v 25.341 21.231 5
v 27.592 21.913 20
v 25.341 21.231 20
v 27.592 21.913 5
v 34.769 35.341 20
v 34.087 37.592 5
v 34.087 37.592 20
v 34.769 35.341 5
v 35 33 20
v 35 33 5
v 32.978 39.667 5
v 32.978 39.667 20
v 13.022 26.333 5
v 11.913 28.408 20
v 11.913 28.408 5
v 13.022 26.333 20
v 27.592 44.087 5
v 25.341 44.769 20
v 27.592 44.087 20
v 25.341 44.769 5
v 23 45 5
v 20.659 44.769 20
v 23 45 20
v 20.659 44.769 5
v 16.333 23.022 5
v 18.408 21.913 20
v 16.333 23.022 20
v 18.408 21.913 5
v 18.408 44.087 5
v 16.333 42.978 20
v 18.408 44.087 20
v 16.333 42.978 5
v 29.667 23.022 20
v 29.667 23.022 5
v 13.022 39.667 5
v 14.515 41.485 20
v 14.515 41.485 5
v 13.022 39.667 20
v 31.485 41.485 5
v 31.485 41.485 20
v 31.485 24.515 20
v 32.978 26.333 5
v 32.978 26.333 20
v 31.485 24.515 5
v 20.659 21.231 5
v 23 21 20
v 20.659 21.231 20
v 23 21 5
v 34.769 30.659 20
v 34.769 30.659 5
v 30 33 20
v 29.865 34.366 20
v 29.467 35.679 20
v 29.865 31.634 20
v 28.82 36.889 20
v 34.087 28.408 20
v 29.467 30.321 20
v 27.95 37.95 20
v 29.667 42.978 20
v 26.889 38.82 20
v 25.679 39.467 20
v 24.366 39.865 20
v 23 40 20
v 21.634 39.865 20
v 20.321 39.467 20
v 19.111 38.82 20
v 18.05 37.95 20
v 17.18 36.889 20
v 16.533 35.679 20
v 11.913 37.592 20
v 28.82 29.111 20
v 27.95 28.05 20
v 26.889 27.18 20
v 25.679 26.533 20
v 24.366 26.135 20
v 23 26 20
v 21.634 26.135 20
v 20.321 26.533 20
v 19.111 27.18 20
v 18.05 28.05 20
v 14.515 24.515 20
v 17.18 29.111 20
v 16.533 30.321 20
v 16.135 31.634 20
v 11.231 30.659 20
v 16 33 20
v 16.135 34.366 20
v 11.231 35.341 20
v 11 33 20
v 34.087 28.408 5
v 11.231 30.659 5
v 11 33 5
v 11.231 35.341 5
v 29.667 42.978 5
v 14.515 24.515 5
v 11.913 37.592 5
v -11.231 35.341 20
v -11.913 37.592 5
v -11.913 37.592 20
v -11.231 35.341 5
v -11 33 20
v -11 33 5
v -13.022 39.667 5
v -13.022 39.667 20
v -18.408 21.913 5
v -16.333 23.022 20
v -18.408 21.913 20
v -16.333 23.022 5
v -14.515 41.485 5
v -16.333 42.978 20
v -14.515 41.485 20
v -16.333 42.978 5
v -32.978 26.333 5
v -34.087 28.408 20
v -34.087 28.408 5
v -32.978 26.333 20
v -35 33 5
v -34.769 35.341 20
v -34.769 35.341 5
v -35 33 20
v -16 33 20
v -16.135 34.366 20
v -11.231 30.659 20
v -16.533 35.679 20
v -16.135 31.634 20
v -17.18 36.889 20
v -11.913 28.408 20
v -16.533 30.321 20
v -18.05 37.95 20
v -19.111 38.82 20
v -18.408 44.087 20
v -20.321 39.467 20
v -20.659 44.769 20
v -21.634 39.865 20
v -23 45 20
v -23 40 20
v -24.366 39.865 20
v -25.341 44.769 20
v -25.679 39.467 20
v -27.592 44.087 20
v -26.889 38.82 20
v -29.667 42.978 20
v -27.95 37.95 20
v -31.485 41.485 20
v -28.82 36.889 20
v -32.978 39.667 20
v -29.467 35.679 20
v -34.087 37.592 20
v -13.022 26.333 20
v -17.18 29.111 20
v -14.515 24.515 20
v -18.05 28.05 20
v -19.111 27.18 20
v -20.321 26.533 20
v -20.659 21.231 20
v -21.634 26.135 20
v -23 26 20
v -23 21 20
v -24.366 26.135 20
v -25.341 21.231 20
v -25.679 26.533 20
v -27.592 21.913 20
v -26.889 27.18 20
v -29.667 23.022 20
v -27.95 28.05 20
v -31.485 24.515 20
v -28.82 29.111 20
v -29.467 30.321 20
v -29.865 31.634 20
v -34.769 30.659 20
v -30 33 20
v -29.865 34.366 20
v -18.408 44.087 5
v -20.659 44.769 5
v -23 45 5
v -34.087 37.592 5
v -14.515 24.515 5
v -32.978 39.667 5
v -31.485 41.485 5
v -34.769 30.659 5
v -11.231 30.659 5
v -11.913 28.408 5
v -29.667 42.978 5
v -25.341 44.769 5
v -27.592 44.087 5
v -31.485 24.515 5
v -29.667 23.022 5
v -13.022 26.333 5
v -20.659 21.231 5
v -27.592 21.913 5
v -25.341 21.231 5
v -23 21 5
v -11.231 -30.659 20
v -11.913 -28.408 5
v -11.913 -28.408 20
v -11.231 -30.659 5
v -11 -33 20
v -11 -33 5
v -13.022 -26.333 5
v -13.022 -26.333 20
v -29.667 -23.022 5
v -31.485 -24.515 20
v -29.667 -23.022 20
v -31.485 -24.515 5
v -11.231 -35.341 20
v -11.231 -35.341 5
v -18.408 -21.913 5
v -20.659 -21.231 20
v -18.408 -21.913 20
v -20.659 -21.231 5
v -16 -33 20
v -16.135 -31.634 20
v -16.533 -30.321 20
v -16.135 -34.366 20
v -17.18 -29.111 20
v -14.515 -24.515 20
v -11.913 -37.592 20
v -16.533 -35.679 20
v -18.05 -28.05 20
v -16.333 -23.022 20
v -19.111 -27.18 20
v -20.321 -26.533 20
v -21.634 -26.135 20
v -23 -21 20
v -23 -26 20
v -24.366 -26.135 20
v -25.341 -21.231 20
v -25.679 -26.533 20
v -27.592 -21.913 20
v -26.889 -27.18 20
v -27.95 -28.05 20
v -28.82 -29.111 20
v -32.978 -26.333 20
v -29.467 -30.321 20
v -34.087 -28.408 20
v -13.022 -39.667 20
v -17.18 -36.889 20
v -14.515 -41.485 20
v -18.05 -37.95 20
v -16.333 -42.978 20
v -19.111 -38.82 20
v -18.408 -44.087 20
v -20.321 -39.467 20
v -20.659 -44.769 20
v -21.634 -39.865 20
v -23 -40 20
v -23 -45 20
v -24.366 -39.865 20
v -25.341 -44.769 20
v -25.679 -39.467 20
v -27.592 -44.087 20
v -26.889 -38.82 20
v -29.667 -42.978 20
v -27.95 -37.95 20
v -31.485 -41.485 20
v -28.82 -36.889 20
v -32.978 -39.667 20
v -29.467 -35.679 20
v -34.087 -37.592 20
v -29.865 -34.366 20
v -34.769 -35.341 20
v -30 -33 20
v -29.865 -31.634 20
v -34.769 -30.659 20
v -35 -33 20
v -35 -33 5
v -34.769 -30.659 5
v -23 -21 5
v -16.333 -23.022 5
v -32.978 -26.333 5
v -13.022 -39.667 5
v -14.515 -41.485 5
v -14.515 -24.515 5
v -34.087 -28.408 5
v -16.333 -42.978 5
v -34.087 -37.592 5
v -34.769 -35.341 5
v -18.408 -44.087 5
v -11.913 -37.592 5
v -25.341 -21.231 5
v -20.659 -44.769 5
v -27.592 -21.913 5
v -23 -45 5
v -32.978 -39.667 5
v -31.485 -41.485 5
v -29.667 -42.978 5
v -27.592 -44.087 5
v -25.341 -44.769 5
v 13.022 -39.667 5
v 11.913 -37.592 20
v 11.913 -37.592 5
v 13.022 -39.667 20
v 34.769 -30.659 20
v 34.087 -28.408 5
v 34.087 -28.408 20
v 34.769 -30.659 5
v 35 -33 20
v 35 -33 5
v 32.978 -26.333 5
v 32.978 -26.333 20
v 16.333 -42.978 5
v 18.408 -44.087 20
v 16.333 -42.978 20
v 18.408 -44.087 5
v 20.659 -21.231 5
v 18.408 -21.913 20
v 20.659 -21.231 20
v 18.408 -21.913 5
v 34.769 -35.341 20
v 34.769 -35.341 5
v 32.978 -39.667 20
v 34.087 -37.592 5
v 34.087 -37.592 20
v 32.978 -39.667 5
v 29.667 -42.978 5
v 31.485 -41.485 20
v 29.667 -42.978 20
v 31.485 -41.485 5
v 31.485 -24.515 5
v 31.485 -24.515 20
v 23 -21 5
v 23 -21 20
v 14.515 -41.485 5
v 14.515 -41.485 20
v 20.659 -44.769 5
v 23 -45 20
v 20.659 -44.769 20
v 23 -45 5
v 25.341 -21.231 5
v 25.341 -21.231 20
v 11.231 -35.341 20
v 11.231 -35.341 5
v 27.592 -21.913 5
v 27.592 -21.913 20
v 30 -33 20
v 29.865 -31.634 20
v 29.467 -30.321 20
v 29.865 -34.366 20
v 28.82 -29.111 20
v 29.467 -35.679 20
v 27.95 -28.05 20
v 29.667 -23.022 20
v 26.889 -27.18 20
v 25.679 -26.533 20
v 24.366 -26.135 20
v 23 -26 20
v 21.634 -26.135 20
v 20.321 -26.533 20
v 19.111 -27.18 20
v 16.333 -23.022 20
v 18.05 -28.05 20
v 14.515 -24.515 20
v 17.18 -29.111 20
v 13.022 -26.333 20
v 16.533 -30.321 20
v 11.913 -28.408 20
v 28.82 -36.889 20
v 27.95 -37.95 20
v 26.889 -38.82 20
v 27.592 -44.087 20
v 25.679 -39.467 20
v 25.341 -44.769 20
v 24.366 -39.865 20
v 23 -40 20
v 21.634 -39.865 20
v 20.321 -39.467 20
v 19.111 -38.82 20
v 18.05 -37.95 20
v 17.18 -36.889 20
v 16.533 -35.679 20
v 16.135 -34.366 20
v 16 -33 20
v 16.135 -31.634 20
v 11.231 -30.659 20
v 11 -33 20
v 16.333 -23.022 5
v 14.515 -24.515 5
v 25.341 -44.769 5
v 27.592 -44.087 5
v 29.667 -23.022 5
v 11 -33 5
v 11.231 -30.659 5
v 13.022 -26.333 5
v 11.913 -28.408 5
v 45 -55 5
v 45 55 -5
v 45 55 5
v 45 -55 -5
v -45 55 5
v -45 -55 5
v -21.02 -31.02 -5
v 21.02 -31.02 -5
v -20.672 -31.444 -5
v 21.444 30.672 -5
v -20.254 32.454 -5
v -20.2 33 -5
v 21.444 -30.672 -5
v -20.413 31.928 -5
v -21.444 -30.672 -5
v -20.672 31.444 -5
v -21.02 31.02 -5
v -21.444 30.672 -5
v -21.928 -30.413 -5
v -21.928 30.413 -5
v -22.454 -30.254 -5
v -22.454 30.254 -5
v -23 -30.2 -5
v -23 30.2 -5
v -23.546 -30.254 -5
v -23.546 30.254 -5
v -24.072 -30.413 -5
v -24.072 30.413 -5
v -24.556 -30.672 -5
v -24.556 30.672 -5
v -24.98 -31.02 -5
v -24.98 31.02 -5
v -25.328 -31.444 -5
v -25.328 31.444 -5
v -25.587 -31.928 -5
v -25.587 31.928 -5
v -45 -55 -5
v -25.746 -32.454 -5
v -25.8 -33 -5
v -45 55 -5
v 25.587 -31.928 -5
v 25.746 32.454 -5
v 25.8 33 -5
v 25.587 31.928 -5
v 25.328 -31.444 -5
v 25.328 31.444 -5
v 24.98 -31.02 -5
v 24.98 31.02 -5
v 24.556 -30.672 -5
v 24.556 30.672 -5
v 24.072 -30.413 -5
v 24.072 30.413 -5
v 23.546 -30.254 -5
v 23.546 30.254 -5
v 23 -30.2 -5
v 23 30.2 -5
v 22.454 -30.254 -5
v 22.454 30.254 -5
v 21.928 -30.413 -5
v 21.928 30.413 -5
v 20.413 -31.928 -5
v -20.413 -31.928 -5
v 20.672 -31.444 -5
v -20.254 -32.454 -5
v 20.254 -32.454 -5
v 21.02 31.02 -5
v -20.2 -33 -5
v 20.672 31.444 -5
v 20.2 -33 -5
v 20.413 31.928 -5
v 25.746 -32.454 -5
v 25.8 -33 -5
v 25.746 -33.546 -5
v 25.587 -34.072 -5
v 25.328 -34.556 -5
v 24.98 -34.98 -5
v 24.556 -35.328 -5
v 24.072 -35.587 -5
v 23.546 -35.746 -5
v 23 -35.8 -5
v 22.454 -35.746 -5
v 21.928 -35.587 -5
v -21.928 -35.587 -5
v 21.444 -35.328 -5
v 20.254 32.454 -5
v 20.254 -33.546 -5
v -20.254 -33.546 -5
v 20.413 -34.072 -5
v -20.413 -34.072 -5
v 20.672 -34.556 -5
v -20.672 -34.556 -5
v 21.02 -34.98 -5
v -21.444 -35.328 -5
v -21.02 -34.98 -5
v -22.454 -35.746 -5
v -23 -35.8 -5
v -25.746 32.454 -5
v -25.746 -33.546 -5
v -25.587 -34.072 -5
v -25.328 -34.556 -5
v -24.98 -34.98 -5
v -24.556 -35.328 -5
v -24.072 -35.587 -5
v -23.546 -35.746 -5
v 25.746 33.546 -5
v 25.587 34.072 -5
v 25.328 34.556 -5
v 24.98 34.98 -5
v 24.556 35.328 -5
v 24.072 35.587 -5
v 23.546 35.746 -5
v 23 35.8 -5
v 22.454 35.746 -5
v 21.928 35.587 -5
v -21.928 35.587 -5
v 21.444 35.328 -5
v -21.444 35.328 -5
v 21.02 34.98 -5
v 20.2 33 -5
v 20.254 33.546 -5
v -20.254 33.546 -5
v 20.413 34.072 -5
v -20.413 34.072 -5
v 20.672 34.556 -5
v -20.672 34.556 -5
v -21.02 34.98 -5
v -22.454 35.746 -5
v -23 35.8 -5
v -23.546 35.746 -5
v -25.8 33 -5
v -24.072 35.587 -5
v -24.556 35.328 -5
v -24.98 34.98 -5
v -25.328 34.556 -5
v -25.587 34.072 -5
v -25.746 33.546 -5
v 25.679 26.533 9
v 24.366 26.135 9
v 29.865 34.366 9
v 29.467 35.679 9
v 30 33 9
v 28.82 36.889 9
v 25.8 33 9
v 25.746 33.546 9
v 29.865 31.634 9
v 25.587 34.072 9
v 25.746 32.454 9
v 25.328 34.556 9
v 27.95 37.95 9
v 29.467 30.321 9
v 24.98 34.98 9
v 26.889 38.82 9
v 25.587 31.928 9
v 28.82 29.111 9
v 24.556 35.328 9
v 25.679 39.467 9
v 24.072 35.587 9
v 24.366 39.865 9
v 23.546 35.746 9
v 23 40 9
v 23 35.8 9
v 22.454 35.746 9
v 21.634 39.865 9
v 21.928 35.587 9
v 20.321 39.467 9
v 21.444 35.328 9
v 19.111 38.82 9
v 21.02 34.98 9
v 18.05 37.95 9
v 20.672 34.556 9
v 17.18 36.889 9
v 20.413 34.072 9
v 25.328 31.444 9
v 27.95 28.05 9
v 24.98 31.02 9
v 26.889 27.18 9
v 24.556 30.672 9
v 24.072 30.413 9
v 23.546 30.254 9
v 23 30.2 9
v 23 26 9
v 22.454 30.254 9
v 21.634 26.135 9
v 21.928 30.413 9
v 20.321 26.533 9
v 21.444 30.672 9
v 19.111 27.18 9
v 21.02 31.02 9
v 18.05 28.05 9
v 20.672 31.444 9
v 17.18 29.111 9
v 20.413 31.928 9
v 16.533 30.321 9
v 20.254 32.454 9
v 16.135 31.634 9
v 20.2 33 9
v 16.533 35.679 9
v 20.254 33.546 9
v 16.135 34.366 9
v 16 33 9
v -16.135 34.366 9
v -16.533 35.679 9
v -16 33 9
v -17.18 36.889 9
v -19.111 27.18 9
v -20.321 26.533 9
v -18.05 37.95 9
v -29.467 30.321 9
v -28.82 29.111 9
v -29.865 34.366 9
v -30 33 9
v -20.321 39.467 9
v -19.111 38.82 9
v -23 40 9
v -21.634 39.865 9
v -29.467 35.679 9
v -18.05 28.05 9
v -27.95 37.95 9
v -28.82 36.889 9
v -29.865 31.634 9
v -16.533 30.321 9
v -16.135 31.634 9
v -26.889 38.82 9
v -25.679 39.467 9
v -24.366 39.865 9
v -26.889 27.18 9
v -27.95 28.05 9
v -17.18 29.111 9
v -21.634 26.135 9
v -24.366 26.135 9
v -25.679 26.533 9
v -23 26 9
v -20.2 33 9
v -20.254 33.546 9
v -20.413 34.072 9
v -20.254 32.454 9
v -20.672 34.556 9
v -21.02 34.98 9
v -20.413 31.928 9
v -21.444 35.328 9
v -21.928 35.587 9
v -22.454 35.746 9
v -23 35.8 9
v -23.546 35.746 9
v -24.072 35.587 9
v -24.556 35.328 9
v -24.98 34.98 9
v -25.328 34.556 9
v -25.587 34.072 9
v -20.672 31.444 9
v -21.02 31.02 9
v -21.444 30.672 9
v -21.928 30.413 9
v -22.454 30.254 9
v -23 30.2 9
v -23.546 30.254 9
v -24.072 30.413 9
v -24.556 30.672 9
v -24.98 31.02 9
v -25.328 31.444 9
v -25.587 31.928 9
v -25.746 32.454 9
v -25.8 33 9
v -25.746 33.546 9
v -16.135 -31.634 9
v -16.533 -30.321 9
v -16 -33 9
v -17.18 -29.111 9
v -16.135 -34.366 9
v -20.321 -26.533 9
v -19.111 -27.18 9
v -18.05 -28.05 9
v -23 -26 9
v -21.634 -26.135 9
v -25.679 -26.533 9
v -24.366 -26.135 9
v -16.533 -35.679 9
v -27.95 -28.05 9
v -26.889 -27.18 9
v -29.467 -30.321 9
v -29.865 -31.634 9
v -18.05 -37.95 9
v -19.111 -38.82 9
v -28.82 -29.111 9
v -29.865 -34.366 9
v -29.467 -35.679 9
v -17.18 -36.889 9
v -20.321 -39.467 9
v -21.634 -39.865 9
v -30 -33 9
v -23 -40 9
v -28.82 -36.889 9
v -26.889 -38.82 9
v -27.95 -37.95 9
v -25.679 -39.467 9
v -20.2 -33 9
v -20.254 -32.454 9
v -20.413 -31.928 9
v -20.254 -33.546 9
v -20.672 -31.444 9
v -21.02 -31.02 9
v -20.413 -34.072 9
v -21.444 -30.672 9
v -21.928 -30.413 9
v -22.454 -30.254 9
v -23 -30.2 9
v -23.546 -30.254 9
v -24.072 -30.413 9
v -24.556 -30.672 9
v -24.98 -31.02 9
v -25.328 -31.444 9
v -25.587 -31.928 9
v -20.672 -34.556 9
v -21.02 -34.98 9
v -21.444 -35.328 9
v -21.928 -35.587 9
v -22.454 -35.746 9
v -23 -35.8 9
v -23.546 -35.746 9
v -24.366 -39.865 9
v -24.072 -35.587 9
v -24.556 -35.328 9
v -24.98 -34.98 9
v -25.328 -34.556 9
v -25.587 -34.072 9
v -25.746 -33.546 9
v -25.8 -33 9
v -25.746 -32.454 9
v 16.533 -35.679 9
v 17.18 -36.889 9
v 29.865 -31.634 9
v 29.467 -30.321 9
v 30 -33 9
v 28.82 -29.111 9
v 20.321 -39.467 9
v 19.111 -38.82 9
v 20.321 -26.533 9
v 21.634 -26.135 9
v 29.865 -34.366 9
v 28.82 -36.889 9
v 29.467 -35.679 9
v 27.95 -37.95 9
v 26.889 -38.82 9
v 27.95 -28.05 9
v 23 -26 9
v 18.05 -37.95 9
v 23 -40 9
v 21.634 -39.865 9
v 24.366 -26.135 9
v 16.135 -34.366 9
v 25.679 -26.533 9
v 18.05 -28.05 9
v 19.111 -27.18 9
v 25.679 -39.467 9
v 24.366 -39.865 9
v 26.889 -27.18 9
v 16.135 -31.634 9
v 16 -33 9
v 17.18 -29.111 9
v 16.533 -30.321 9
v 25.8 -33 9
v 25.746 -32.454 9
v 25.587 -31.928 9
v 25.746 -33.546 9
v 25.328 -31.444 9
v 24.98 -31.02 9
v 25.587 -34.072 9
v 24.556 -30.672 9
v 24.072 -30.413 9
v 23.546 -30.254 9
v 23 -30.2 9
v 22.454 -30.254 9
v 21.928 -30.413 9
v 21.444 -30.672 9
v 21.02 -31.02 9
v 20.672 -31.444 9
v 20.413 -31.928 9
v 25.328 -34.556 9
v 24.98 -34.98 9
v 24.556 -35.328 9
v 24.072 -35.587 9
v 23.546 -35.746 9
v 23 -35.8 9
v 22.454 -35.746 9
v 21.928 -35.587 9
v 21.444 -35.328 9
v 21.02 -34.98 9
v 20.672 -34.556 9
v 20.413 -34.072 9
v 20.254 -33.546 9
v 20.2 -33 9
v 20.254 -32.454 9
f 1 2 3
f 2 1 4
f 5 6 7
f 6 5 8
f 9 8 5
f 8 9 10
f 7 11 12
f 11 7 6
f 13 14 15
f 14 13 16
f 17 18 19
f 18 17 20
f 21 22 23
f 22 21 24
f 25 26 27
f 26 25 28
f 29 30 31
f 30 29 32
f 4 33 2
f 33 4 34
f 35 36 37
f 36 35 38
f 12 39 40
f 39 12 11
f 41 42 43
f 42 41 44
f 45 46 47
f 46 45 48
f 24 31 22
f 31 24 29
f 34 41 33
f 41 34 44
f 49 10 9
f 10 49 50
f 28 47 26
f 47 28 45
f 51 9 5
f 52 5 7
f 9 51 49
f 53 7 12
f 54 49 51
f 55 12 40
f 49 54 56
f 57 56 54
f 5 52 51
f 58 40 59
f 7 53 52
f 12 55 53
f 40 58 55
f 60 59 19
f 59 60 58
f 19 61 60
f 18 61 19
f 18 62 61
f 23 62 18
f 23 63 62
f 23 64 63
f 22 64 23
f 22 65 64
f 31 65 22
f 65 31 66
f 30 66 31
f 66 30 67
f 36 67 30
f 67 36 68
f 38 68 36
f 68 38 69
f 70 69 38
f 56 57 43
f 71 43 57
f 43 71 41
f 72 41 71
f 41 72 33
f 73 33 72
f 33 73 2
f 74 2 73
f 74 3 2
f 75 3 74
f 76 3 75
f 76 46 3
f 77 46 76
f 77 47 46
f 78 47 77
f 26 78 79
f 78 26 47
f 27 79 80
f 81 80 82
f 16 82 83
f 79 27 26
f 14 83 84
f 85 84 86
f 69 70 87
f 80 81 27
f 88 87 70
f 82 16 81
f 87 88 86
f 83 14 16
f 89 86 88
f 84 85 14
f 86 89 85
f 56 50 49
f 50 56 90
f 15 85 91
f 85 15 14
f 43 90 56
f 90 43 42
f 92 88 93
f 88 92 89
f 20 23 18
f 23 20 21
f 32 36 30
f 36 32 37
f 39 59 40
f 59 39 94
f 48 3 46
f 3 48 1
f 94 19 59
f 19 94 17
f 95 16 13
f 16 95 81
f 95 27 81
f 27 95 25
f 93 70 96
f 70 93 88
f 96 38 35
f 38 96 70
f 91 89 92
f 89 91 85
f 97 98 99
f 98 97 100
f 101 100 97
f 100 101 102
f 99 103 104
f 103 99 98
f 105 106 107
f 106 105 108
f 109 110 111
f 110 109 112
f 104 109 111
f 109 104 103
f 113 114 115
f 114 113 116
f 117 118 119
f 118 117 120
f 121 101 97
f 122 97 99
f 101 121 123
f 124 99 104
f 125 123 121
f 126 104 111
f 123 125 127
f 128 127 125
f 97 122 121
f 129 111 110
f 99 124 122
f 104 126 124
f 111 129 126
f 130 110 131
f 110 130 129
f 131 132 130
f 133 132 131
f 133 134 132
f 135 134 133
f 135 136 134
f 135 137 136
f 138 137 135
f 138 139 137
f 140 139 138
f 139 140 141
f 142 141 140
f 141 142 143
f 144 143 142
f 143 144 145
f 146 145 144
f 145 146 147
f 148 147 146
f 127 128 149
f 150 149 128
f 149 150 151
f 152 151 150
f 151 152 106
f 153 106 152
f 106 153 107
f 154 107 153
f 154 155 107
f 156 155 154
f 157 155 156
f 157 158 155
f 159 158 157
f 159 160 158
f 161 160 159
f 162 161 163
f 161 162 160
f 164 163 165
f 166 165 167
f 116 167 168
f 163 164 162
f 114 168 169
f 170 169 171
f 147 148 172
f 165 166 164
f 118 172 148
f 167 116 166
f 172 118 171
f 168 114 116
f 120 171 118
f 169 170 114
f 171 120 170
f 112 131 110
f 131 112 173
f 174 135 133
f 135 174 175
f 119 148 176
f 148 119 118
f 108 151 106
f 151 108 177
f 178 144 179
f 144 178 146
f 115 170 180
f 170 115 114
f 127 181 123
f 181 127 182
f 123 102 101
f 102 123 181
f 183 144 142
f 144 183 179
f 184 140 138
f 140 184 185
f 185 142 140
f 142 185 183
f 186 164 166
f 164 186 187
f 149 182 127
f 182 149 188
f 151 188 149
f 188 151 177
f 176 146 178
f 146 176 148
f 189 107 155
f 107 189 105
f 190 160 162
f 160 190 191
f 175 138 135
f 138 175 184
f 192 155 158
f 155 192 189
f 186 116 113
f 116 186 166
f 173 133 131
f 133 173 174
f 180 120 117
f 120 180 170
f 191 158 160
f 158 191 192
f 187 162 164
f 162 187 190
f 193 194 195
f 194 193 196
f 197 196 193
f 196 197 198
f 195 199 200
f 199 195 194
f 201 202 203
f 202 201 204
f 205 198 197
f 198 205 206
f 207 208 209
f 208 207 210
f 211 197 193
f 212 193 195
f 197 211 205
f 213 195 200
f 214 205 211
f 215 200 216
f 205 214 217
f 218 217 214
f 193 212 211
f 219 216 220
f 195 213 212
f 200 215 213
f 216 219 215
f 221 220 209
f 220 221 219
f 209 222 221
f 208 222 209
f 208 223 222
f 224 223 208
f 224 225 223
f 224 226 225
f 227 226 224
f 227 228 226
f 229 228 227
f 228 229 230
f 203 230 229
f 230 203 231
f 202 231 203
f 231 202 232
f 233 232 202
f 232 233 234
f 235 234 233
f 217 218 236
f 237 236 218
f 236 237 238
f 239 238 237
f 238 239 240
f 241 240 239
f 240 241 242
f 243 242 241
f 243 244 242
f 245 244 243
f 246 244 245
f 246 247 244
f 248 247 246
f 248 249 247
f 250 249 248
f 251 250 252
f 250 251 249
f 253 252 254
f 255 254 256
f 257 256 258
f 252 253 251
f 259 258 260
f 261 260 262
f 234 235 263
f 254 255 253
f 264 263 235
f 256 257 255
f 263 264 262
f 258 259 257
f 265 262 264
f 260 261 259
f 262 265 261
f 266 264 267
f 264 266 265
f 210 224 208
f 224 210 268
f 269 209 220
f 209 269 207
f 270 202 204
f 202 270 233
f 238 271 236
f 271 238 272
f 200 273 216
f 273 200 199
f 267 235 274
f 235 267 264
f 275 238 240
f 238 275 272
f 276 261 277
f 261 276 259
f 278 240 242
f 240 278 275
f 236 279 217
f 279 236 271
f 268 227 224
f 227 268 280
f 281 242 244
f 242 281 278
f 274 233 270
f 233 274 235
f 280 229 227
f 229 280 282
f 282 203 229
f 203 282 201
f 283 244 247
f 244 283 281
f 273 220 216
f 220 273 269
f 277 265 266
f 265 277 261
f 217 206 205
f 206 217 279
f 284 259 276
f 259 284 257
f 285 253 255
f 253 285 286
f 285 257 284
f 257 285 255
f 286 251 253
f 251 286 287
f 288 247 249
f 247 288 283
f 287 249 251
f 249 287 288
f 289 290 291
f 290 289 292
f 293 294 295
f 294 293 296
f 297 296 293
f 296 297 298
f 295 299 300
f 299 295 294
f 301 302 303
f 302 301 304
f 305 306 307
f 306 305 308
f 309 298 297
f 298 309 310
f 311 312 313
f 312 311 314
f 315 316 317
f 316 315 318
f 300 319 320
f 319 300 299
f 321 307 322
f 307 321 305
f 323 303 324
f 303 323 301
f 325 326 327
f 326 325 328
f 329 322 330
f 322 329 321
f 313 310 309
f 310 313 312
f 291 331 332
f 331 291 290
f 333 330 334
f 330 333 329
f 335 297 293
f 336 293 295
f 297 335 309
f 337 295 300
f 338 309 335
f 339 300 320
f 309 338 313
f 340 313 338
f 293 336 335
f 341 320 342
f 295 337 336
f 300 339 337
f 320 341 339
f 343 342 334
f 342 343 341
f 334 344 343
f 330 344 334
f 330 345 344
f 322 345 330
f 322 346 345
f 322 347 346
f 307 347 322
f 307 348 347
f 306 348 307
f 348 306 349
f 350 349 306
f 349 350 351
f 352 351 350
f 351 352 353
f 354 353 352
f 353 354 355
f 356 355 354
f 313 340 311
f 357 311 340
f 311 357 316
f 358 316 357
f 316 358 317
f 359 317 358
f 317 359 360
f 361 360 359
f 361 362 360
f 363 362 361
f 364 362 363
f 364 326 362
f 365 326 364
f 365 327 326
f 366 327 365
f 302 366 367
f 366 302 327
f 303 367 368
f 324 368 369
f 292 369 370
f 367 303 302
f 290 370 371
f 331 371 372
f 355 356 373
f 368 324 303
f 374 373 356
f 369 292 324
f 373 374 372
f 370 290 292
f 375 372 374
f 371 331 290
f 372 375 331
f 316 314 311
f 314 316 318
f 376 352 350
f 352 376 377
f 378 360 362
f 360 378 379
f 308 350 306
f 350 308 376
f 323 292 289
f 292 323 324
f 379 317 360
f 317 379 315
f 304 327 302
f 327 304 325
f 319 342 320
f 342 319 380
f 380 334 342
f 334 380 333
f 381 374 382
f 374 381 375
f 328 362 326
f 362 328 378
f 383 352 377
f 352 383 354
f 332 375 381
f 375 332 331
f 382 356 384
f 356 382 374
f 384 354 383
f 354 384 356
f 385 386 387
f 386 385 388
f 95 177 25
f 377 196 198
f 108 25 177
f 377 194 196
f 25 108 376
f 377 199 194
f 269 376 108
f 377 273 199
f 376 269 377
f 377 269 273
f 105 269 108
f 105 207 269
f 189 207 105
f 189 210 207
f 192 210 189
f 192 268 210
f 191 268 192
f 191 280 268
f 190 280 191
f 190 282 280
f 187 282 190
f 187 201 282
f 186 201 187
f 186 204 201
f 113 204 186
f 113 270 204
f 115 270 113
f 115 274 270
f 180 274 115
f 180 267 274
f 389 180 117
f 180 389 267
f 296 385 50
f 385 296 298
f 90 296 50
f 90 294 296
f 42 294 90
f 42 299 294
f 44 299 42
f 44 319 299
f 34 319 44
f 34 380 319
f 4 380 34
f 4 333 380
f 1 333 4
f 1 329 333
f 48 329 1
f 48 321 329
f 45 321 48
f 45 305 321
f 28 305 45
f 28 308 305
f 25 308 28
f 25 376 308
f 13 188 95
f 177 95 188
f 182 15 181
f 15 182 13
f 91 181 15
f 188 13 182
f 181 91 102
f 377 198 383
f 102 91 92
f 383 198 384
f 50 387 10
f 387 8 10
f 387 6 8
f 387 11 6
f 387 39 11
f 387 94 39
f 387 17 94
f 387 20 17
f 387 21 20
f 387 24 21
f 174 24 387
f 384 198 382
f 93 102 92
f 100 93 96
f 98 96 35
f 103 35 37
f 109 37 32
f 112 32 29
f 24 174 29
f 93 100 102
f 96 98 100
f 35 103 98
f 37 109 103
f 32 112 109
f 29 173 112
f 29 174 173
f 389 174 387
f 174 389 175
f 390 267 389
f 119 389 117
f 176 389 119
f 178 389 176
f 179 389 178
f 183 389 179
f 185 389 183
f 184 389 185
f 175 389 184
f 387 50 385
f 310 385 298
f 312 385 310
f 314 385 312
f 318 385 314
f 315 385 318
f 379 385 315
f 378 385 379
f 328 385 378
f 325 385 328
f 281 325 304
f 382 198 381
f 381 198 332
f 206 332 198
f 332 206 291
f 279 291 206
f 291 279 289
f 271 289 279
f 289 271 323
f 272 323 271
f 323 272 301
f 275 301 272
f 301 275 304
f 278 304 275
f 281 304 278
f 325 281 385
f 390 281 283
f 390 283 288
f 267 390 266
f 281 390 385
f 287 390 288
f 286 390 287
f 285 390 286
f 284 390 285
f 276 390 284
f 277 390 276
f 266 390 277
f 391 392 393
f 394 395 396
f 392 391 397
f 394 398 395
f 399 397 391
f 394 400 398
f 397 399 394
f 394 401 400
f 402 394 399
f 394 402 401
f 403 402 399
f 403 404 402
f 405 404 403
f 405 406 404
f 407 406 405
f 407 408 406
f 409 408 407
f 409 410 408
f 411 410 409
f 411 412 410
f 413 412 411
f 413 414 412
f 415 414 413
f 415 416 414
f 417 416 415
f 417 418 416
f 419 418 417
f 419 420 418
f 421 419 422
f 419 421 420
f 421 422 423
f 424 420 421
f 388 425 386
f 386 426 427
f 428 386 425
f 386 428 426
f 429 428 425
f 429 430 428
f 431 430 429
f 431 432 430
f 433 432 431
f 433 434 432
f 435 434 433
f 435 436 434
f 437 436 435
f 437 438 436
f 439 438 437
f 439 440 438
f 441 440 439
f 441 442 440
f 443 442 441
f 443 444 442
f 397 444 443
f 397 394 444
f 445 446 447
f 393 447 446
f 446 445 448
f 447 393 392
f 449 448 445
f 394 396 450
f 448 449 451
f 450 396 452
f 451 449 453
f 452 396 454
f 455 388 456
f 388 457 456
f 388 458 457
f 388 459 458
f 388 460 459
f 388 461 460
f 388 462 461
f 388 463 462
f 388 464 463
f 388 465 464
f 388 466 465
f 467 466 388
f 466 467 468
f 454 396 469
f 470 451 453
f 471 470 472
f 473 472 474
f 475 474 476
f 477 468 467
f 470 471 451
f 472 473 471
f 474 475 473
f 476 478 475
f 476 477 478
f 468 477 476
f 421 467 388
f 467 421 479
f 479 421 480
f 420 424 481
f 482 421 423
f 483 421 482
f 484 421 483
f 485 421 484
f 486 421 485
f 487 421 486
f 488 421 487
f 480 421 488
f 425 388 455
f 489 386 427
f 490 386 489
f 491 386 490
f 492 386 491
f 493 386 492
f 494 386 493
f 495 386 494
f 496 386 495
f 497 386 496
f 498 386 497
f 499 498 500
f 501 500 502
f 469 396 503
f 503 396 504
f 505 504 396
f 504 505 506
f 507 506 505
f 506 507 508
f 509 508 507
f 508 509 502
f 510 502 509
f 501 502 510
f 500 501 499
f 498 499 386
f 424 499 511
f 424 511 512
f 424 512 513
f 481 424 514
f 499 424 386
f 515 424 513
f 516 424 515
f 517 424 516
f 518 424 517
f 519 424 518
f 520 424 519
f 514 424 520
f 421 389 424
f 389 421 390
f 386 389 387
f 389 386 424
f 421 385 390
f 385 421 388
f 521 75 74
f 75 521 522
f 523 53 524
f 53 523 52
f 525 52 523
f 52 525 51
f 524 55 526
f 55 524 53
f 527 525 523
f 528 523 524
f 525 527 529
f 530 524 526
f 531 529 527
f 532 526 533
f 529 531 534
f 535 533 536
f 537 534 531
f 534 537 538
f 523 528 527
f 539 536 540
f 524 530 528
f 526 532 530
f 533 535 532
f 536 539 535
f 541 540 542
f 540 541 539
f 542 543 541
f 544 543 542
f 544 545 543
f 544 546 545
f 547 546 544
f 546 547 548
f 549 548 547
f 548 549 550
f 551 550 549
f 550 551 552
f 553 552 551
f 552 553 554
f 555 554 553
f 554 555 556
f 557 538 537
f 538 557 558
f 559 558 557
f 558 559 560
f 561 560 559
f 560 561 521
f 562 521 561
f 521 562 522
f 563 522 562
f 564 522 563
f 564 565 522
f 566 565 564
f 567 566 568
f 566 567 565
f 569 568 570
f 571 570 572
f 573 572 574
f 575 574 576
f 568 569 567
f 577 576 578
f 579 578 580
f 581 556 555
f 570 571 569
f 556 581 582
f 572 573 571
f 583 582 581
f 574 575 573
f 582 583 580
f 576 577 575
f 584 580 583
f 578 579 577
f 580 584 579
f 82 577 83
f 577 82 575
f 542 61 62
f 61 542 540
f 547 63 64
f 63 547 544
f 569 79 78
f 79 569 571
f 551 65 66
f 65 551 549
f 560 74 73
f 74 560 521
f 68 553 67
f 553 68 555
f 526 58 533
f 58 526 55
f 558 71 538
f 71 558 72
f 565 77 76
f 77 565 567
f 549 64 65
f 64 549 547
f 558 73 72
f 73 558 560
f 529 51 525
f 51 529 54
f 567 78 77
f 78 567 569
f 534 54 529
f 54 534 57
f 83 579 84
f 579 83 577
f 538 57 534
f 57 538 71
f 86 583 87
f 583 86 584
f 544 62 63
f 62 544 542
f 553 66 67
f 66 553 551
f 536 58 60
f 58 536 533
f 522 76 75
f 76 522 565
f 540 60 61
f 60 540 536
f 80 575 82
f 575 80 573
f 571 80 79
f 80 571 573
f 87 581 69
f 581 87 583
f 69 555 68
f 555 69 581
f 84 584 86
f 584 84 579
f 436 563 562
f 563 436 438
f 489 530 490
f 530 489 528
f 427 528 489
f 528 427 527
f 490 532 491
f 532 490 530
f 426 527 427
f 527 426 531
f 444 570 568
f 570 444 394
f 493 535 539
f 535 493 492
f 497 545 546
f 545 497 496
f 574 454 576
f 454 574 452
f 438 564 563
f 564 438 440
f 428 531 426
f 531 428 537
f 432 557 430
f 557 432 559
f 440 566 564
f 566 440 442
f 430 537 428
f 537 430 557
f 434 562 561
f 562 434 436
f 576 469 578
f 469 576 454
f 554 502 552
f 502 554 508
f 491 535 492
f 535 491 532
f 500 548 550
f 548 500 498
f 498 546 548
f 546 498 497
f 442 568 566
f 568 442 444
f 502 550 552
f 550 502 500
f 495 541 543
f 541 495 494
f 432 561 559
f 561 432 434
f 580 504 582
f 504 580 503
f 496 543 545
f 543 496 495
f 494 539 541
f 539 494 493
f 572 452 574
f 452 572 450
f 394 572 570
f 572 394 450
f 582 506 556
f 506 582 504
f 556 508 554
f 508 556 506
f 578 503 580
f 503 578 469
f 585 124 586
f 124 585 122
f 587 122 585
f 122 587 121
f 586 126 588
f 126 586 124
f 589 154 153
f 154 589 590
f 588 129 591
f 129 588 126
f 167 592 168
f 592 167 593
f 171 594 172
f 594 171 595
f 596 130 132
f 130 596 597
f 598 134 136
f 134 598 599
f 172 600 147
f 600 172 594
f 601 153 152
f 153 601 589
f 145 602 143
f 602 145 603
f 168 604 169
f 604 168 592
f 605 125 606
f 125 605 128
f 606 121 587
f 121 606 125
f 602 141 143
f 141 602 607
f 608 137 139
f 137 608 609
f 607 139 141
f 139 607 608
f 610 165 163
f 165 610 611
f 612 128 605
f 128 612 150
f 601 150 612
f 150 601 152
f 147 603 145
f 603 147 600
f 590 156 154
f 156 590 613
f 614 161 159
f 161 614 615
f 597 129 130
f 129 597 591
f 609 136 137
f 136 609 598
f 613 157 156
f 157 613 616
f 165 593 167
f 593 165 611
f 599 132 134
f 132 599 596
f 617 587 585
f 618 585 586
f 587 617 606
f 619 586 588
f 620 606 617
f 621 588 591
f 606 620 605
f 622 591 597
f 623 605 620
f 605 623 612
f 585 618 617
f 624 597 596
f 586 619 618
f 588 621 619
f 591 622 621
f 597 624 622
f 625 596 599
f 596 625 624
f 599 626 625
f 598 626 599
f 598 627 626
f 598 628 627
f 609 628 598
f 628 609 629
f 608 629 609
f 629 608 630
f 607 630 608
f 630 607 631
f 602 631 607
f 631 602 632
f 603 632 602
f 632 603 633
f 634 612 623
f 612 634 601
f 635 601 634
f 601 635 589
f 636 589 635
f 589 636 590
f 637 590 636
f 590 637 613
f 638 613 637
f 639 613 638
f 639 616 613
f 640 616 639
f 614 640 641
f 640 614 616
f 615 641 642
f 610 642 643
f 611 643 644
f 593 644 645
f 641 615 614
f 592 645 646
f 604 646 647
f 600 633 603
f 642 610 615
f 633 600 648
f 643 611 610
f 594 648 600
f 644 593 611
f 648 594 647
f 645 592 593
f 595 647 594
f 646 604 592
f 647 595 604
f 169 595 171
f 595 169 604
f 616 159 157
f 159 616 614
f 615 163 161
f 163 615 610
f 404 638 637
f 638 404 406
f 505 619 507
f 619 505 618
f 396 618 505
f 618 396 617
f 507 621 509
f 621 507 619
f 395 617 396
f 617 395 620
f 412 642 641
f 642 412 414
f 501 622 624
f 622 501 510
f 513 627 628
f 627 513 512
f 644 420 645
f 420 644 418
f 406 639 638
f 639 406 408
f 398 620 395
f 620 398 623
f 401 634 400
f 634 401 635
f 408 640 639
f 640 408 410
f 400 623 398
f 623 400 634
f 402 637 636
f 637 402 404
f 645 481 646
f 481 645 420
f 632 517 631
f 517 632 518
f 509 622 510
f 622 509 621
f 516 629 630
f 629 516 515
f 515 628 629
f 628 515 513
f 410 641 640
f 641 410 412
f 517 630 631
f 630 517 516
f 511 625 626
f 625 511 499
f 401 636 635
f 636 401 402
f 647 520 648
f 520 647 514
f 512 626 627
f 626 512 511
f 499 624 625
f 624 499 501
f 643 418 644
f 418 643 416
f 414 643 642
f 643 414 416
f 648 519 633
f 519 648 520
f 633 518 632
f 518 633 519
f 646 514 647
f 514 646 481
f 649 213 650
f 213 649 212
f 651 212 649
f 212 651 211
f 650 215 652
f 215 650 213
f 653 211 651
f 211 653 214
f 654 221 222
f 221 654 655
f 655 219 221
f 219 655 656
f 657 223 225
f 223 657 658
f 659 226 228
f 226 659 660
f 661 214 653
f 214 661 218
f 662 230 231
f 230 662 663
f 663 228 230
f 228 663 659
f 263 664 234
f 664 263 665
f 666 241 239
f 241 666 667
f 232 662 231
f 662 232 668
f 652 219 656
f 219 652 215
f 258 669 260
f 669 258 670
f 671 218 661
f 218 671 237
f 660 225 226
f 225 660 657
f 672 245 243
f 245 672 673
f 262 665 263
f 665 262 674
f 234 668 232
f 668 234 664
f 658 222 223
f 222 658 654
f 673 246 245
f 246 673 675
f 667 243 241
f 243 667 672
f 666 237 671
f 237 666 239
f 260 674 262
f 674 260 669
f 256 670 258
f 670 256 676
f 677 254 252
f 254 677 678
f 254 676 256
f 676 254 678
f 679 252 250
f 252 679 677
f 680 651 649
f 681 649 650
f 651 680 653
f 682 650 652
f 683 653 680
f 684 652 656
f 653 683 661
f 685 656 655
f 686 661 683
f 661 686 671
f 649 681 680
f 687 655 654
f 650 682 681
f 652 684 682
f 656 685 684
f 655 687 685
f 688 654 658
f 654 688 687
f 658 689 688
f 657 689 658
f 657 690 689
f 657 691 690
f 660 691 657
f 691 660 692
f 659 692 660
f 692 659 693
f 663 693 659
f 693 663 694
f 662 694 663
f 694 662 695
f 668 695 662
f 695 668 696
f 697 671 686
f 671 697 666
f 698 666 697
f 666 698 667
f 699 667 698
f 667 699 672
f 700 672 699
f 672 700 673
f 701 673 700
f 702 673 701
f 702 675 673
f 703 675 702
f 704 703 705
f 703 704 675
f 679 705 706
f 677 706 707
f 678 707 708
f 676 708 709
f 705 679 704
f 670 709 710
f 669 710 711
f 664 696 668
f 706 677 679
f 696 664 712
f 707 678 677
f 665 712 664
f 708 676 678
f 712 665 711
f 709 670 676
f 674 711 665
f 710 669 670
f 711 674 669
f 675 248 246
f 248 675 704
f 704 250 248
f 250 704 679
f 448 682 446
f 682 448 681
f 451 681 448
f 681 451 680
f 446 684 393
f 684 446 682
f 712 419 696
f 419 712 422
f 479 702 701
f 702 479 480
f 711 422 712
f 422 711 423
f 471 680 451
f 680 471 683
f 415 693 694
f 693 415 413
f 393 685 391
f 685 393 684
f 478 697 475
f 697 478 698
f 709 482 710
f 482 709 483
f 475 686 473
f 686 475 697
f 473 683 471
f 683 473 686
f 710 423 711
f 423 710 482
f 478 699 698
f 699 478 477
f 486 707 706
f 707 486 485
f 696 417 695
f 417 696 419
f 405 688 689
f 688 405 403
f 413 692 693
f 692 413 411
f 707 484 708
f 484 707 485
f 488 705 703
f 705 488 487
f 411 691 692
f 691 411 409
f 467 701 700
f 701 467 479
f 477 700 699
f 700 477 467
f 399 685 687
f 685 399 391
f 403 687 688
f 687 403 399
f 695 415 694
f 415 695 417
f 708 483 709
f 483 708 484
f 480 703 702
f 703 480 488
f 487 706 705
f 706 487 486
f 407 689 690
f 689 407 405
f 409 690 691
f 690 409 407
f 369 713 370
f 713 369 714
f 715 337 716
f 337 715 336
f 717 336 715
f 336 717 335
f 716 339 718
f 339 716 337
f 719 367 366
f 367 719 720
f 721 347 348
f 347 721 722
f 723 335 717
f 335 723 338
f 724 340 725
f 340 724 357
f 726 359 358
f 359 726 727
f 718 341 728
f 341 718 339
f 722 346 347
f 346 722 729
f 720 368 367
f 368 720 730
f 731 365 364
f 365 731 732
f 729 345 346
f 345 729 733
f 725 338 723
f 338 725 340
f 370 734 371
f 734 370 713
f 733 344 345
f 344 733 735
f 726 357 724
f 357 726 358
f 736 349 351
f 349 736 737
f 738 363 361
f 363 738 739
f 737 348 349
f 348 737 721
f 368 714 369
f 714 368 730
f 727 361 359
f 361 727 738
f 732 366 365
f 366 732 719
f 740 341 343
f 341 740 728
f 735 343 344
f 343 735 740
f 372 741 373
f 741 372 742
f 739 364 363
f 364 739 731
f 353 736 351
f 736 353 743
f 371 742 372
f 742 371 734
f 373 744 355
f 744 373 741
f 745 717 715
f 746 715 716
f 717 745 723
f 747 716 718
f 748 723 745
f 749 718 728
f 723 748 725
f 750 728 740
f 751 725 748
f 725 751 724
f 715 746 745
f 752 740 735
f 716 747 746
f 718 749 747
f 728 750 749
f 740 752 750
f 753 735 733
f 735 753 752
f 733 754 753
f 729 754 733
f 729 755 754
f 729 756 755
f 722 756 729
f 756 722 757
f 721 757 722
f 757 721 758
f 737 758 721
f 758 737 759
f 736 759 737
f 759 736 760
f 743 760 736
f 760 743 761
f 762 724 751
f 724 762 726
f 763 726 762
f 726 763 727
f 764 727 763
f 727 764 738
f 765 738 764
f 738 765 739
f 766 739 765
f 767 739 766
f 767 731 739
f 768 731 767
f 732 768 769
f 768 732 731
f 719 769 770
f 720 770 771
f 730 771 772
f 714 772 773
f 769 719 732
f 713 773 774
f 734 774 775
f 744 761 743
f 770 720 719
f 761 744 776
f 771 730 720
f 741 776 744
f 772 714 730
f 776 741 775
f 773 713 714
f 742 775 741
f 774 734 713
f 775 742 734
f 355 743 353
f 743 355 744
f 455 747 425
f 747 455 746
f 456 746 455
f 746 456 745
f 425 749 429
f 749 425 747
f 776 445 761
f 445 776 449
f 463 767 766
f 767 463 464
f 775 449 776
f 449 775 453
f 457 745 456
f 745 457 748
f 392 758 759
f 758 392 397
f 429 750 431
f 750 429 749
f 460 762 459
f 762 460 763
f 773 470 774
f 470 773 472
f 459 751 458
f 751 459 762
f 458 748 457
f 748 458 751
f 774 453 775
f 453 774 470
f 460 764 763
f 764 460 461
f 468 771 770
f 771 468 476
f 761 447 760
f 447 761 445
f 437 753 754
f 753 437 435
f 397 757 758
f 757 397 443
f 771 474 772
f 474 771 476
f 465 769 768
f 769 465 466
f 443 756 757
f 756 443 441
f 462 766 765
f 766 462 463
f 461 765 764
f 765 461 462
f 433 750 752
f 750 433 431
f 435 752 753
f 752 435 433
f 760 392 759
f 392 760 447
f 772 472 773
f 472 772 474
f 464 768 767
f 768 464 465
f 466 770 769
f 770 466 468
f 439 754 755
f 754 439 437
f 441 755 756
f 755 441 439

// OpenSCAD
$fn = 32;

// ----------------------------------------------------------------------
// Socket pad plate
// bosses with counterbored sockets for the screws
// ----------------------------------------------------------------------

// --- parameters (mm) ---
base_t = 10;            // base plate thickness
boss_h = 15;            // boss height above the base plate
boss_d = 24;            // boss diameter
socket_d = 14;          // socket diameter
socket_depth = 11;      // socket depth from the boss face
bolt_d = 5.6;           // screw clearance hole through the socket floor
plate = [90, 110, 10];  // overall size (x, y, z)
edge = 22;              // boss centre offset from the plate edge
pads = 4;               // boss count, one per corner

// --- derived feature positions (mm) ---
height = base_t + boss_h;        // = 25   overall height of the part
corner_x = plate[0] / 2 - edge;  // = 23   boss centre X
corner_y = plate[1] / 2 - edge;  // = 33   boss centre Y
feature_centers = [
  [corner_x, corner_y],
  [-corner_x, corner_y],
  [-corner_x, -corner_y],
  [corner_x, -corner_y]
];   // boss centres: sockets, holes and the pads themselves are placed from here

// base plate, bosses on feature_centers, socket + through hole in each
difference() {
  union() {
    cube(plate, center = true);
    for (centre = feature_centers)
      translate([centre[0], centre[1], plate[2] / 2 - 1])
        cylinder(d = boss_d, h = boss_h + 1);
  }
  for (centre = feature_centers) {
    translate([centre[0], centre[1], plate[2] / 2 + boss_h - socket_depth])
      cylinder(d = socket_d, h = socket_depth + 1);
    translate([centre[0], centre[1], -height])
      cylinder(d = bolt_d, h = 2 * height + 2);  // through the socket floor
  }
}
